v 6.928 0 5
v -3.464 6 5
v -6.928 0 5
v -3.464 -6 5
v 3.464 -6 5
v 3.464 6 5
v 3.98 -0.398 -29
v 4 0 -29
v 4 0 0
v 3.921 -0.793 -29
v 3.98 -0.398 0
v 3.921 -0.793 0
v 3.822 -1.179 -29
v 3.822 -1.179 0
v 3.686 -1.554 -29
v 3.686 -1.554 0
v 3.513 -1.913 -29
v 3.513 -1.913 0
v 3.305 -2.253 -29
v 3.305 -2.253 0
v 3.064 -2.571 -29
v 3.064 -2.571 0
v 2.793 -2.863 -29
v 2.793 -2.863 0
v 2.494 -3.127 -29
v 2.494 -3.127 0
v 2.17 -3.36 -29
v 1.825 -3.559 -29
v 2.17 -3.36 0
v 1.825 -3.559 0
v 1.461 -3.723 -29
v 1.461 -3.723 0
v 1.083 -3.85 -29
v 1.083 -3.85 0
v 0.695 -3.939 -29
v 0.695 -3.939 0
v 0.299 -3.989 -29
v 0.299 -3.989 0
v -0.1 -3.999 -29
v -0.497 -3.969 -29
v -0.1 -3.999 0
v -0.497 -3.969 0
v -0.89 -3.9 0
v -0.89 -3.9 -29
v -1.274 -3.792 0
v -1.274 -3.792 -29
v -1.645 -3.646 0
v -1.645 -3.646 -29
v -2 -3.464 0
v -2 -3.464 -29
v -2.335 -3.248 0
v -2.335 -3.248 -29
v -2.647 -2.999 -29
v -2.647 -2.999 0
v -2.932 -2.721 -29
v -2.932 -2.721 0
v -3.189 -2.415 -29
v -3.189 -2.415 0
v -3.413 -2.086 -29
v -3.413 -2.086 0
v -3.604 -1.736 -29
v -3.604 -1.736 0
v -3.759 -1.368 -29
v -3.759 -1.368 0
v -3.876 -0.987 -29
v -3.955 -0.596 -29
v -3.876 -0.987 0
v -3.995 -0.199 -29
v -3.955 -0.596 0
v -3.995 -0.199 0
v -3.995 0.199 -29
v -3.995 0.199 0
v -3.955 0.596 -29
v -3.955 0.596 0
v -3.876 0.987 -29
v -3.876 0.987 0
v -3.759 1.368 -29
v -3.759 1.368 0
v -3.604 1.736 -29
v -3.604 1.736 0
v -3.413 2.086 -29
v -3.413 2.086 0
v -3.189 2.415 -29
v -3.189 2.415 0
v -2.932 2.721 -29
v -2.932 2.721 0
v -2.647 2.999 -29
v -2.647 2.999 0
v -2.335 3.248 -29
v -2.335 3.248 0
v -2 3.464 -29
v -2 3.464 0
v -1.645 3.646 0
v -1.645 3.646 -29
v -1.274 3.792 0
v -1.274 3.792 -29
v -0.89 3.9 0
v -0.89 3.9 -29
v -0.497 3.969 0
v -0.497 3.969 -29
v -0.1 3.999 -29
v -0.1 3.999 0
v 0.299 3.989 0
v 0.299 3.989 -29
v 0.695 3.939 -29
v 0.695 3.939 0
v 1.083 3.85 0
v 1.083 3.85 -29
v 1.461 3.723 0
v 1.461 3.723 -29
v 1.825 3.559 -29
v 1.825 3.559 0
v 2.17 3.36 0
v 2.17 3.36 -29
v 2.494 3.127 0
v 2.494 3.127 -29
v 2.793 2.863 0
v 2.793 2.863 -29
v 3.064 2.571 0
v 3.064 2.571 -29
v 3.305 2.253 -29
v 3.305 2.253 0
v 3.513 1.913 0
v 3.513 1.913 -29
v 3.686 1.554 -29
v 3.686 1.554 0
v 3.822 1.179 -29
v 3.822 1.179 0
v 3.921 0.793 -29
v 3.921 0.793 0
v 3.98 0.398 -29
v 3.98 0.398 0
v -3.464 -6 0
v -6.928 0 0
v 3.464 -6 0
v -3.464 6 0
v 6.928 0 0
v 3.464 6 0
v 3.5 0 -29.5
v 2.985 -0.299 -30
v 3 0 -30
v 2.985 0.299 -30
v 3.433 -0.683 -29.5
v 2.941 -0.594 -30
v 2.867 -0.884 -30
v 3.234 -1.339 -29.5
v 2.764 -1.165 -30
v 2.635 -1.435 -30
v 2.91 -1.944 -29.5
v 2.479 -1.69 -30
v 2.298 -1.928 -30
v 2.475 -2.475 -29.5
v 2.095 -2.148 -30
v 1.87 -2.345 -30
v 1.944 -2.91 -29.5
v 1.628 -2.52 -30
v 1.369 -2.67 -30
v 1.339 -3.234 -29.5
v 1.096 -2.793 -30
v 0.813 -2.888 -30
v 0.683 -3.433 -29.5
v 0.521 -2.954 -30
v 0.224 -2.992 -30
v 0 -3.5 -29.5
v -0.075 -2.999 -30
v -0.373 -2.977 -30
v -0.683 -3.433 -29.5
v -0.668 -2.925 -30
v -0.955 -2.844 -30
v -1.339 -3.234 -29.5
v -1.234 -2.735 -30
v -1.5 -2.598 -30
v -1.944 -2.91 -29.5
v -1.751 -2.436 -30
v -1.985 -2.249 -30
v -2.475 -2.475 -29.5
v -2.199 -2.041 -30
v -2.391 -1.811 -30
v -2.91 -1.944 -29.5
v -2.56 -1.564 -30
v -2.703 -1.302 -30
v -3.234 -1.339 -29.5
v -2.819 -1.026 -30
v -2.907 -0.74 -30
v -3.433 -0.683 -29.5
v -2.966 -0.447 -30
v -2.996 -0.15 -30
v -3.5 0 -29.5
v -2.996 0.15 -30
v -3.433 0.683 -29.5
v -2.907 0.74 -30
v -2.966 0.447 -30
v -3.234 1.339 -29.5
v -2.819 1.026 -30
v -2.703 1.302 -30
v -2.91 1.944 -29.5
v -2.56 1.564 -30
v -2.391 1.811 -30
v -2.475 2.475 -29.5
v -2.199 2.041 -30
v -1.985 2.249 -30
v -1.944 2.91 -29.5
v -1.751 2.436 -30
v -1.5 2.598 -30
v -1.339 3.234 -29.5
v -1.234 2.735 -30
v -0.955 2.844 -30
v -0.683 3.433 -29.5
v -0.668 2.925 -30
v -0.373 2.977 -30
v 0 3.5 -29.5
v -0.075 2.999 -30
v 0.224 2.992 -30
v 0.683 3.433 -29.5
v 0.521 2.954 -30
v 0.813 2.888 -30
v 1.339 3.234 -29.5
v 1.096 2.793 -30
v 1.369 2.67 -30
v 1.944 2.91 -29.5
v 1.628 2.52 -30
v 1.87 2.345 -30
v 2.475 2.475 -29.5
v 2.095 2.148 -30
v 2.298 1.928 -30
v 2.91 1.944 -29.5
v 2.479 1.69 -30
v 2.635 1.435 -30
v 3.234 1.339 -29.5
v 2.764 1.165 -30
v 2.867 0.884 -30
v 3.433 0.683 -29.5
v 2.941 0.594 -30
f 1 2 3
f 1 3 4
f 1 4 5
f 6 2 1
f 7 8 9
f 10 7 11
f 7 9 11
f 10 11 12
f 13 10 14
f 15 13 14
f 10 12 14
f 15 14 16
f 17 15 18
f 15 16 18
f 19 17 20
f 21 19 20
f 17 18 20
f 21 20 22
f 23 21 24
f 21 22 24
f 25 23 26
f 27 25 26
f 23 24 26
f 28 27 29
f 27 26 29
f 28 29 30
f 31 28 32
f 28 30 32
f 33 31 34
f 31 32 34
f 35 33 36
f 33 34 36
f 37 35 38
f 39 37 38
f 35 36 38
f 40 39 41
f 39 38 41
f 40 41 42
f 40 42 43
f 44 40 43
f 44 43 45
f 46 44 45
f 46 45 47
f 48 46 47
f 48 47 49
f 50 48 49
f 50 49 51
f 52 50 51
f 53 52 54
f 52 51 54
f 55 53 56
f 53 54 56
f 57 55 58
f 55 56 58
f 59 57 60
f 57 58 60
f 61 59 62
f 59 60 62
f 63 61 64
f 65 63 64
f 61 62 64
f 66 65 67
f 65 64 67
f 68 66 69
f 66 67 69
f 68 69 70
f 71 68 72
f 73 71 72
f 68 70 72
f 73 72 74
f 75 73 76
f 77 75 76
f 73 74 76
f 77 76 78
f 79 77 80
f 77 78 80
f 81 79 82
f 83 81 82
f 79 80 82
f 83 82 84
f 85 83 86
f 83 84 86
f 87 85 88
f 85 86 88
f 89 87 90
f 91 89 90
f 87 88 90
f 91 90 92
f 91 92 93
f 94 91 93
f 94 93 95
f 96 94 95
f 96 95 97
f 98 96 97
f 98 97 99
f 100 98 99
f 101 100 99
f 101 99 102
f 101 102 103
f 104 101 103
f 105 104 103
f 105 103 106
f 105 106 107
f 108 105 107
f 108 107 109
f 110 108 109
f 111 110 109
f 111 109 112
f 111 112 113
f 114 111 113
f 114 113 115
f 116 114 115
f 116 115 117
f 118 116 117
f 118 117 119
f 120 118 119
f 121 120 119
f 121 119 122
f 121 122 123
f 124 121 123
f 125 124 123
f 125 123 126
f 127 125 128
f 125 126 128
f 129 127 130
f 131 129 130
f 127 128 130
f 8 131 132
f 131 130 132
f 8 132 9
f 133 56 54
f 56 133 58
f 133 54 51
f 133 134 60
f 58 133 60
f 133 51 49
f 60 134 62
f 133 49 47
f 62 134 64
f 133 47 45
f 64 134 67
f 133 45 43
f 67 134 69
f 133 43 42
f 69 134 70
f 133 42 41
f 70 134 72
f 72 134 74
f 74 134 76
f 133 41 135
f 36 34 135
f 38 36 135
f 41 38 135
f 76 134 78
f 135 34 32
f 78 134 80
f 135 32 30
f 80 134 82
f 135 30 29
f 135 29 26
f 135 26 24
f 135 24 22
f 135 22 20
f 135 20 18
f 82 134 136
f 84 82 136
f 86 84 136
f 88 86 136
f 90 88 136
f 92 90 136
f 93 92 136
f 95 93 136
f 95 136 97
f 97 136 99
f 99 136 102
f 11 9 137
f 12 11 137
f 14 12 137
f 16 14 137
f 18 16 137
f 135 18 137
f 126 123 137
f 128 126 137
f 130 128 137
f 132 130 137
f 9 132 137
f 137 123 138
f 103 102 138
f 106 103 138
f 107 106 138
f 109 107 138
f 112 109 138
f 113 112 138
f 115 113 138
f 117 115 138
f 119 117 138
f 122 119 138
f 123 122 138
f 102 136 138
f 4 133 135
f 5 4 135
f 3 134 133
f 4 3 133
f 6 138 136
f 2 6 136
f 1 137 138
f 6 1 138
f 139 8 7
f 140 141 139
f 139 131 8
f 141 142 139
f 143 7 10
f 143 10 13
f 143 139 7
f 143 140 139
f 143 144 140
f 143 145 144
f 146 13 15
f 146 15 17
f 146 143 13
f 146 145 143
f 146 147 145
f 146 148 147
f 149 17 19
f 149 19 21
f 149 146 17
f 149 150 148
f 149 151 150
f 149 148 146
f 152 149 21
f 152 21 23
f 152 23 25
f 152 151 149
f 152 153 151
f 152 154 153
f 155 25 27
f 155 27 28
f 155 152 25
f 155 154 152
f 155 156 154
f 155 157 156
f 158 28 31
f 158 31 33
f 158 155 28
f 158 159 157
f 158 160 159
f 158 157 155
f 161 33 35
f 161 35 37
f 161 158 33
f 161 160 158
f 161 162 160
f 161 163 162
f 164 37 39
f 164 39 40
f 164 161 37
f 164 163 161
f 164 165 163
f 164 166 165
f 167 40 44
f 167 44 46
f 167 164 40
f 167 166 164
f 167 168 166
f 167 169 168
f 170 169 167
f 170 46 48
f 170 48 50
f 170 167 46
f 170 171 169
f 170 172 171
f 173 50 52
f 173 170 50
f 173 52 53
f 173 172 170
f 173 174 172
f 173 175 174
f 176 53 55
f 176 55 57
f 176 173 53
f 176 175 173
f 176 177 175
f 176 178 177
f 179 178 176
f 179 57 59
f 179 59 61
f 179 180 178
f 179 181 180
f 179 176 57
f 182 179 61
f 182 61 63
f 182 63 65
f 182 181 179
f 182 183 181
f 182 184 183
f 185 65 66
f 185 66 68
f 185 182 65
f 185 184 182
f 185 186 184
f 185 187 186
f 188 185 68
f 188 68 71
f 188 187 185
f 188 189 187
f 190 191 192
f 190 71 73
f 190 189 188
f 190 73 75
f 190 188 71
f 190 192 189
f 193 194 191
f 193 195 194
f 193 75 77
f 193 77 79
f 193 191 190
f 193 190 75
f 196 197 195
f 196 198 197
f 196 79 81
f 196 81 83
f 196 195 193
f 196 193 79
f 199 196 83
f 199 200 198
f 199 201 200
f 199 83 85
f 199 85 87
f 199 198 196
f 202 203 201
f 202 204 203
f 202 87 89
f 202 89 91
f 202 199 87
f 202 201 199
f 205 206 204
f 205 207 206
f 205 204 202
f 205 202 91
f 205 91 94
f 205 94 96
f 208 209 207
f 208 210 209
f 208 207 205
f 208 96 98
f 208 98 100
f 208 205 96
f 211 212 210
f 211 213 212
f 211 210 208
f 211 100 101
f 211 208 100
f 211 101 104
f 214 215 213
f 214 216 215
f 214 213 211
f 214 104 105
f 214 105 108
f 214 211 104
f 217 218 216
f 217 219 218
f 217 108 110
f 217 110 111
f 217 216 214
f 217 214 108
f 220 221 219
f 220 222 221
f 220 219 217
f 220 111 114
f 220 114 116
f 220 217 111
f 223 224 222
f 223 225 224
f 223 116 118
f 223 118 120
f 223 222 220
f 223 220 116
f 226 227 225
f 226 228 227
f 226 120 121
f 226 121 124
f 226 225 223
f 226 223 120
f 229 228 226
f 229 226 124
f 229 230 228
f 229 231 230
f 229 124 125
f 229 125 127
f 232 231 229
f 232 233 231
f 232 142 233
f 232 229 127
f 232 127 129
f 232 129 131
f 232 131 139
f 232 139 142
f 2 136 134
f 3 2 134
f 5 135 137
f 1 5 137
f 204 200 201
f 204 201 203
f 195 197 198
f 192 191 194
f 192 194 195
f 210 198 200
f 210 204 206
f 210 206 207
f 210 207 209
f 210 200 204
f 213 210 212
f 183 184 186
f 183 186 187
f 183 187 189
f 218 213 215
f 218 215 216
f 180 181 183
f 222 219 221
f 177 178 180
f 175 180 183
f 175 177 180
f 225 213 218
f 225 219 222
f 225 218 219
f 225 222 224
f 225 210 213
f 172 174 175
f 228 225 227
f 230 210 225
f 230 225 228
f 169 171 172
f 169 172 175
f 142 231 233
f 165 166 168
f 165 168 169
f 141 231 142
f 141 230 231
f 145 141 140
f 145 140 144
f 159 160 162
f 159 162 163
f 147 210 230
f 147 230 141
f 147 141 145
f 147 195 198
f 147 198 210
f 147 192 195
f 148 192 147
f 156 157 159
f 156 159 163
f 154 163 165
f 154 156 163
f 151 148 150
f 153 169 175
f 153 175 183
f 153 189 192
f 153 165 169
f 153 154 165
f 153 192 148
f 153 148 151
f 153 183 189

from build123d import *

# Parameters (mm, degrees)
F1_DEPTH = 5
F2_R     = 4
F3_DEPTH = 30
F4_SIZE  = 1


with BuildPart() as f1:
    # F0 (on Top) → F1 (new body)
    with BuildSketch(Plane.XY):
        Polygon((3.464102, 6), (-3.464102, 6), (-6.928203, 0), (-3.464102, -6), (3.464102, -6), (6.928203, 0), align=None)
    extrude(amount=F1_DEPTH)

    # F2 (on face) → F3 (join)
    with BuildSketch(Plane(origin=(0, 0, 0), x_dir=(1, 0, 0), z_dir=(0, 0, -1))):
        Circle(F2_R)
    extrude(amount=F3_DEPTH)

    # F4
    f4_edges = [f1.edges().sort_by_distance(p)[0] for p in [
        (-4, 0, -30),
    ]]
    chamfer(f4_edges, length=F4_SIZE)


solid = f1.part
